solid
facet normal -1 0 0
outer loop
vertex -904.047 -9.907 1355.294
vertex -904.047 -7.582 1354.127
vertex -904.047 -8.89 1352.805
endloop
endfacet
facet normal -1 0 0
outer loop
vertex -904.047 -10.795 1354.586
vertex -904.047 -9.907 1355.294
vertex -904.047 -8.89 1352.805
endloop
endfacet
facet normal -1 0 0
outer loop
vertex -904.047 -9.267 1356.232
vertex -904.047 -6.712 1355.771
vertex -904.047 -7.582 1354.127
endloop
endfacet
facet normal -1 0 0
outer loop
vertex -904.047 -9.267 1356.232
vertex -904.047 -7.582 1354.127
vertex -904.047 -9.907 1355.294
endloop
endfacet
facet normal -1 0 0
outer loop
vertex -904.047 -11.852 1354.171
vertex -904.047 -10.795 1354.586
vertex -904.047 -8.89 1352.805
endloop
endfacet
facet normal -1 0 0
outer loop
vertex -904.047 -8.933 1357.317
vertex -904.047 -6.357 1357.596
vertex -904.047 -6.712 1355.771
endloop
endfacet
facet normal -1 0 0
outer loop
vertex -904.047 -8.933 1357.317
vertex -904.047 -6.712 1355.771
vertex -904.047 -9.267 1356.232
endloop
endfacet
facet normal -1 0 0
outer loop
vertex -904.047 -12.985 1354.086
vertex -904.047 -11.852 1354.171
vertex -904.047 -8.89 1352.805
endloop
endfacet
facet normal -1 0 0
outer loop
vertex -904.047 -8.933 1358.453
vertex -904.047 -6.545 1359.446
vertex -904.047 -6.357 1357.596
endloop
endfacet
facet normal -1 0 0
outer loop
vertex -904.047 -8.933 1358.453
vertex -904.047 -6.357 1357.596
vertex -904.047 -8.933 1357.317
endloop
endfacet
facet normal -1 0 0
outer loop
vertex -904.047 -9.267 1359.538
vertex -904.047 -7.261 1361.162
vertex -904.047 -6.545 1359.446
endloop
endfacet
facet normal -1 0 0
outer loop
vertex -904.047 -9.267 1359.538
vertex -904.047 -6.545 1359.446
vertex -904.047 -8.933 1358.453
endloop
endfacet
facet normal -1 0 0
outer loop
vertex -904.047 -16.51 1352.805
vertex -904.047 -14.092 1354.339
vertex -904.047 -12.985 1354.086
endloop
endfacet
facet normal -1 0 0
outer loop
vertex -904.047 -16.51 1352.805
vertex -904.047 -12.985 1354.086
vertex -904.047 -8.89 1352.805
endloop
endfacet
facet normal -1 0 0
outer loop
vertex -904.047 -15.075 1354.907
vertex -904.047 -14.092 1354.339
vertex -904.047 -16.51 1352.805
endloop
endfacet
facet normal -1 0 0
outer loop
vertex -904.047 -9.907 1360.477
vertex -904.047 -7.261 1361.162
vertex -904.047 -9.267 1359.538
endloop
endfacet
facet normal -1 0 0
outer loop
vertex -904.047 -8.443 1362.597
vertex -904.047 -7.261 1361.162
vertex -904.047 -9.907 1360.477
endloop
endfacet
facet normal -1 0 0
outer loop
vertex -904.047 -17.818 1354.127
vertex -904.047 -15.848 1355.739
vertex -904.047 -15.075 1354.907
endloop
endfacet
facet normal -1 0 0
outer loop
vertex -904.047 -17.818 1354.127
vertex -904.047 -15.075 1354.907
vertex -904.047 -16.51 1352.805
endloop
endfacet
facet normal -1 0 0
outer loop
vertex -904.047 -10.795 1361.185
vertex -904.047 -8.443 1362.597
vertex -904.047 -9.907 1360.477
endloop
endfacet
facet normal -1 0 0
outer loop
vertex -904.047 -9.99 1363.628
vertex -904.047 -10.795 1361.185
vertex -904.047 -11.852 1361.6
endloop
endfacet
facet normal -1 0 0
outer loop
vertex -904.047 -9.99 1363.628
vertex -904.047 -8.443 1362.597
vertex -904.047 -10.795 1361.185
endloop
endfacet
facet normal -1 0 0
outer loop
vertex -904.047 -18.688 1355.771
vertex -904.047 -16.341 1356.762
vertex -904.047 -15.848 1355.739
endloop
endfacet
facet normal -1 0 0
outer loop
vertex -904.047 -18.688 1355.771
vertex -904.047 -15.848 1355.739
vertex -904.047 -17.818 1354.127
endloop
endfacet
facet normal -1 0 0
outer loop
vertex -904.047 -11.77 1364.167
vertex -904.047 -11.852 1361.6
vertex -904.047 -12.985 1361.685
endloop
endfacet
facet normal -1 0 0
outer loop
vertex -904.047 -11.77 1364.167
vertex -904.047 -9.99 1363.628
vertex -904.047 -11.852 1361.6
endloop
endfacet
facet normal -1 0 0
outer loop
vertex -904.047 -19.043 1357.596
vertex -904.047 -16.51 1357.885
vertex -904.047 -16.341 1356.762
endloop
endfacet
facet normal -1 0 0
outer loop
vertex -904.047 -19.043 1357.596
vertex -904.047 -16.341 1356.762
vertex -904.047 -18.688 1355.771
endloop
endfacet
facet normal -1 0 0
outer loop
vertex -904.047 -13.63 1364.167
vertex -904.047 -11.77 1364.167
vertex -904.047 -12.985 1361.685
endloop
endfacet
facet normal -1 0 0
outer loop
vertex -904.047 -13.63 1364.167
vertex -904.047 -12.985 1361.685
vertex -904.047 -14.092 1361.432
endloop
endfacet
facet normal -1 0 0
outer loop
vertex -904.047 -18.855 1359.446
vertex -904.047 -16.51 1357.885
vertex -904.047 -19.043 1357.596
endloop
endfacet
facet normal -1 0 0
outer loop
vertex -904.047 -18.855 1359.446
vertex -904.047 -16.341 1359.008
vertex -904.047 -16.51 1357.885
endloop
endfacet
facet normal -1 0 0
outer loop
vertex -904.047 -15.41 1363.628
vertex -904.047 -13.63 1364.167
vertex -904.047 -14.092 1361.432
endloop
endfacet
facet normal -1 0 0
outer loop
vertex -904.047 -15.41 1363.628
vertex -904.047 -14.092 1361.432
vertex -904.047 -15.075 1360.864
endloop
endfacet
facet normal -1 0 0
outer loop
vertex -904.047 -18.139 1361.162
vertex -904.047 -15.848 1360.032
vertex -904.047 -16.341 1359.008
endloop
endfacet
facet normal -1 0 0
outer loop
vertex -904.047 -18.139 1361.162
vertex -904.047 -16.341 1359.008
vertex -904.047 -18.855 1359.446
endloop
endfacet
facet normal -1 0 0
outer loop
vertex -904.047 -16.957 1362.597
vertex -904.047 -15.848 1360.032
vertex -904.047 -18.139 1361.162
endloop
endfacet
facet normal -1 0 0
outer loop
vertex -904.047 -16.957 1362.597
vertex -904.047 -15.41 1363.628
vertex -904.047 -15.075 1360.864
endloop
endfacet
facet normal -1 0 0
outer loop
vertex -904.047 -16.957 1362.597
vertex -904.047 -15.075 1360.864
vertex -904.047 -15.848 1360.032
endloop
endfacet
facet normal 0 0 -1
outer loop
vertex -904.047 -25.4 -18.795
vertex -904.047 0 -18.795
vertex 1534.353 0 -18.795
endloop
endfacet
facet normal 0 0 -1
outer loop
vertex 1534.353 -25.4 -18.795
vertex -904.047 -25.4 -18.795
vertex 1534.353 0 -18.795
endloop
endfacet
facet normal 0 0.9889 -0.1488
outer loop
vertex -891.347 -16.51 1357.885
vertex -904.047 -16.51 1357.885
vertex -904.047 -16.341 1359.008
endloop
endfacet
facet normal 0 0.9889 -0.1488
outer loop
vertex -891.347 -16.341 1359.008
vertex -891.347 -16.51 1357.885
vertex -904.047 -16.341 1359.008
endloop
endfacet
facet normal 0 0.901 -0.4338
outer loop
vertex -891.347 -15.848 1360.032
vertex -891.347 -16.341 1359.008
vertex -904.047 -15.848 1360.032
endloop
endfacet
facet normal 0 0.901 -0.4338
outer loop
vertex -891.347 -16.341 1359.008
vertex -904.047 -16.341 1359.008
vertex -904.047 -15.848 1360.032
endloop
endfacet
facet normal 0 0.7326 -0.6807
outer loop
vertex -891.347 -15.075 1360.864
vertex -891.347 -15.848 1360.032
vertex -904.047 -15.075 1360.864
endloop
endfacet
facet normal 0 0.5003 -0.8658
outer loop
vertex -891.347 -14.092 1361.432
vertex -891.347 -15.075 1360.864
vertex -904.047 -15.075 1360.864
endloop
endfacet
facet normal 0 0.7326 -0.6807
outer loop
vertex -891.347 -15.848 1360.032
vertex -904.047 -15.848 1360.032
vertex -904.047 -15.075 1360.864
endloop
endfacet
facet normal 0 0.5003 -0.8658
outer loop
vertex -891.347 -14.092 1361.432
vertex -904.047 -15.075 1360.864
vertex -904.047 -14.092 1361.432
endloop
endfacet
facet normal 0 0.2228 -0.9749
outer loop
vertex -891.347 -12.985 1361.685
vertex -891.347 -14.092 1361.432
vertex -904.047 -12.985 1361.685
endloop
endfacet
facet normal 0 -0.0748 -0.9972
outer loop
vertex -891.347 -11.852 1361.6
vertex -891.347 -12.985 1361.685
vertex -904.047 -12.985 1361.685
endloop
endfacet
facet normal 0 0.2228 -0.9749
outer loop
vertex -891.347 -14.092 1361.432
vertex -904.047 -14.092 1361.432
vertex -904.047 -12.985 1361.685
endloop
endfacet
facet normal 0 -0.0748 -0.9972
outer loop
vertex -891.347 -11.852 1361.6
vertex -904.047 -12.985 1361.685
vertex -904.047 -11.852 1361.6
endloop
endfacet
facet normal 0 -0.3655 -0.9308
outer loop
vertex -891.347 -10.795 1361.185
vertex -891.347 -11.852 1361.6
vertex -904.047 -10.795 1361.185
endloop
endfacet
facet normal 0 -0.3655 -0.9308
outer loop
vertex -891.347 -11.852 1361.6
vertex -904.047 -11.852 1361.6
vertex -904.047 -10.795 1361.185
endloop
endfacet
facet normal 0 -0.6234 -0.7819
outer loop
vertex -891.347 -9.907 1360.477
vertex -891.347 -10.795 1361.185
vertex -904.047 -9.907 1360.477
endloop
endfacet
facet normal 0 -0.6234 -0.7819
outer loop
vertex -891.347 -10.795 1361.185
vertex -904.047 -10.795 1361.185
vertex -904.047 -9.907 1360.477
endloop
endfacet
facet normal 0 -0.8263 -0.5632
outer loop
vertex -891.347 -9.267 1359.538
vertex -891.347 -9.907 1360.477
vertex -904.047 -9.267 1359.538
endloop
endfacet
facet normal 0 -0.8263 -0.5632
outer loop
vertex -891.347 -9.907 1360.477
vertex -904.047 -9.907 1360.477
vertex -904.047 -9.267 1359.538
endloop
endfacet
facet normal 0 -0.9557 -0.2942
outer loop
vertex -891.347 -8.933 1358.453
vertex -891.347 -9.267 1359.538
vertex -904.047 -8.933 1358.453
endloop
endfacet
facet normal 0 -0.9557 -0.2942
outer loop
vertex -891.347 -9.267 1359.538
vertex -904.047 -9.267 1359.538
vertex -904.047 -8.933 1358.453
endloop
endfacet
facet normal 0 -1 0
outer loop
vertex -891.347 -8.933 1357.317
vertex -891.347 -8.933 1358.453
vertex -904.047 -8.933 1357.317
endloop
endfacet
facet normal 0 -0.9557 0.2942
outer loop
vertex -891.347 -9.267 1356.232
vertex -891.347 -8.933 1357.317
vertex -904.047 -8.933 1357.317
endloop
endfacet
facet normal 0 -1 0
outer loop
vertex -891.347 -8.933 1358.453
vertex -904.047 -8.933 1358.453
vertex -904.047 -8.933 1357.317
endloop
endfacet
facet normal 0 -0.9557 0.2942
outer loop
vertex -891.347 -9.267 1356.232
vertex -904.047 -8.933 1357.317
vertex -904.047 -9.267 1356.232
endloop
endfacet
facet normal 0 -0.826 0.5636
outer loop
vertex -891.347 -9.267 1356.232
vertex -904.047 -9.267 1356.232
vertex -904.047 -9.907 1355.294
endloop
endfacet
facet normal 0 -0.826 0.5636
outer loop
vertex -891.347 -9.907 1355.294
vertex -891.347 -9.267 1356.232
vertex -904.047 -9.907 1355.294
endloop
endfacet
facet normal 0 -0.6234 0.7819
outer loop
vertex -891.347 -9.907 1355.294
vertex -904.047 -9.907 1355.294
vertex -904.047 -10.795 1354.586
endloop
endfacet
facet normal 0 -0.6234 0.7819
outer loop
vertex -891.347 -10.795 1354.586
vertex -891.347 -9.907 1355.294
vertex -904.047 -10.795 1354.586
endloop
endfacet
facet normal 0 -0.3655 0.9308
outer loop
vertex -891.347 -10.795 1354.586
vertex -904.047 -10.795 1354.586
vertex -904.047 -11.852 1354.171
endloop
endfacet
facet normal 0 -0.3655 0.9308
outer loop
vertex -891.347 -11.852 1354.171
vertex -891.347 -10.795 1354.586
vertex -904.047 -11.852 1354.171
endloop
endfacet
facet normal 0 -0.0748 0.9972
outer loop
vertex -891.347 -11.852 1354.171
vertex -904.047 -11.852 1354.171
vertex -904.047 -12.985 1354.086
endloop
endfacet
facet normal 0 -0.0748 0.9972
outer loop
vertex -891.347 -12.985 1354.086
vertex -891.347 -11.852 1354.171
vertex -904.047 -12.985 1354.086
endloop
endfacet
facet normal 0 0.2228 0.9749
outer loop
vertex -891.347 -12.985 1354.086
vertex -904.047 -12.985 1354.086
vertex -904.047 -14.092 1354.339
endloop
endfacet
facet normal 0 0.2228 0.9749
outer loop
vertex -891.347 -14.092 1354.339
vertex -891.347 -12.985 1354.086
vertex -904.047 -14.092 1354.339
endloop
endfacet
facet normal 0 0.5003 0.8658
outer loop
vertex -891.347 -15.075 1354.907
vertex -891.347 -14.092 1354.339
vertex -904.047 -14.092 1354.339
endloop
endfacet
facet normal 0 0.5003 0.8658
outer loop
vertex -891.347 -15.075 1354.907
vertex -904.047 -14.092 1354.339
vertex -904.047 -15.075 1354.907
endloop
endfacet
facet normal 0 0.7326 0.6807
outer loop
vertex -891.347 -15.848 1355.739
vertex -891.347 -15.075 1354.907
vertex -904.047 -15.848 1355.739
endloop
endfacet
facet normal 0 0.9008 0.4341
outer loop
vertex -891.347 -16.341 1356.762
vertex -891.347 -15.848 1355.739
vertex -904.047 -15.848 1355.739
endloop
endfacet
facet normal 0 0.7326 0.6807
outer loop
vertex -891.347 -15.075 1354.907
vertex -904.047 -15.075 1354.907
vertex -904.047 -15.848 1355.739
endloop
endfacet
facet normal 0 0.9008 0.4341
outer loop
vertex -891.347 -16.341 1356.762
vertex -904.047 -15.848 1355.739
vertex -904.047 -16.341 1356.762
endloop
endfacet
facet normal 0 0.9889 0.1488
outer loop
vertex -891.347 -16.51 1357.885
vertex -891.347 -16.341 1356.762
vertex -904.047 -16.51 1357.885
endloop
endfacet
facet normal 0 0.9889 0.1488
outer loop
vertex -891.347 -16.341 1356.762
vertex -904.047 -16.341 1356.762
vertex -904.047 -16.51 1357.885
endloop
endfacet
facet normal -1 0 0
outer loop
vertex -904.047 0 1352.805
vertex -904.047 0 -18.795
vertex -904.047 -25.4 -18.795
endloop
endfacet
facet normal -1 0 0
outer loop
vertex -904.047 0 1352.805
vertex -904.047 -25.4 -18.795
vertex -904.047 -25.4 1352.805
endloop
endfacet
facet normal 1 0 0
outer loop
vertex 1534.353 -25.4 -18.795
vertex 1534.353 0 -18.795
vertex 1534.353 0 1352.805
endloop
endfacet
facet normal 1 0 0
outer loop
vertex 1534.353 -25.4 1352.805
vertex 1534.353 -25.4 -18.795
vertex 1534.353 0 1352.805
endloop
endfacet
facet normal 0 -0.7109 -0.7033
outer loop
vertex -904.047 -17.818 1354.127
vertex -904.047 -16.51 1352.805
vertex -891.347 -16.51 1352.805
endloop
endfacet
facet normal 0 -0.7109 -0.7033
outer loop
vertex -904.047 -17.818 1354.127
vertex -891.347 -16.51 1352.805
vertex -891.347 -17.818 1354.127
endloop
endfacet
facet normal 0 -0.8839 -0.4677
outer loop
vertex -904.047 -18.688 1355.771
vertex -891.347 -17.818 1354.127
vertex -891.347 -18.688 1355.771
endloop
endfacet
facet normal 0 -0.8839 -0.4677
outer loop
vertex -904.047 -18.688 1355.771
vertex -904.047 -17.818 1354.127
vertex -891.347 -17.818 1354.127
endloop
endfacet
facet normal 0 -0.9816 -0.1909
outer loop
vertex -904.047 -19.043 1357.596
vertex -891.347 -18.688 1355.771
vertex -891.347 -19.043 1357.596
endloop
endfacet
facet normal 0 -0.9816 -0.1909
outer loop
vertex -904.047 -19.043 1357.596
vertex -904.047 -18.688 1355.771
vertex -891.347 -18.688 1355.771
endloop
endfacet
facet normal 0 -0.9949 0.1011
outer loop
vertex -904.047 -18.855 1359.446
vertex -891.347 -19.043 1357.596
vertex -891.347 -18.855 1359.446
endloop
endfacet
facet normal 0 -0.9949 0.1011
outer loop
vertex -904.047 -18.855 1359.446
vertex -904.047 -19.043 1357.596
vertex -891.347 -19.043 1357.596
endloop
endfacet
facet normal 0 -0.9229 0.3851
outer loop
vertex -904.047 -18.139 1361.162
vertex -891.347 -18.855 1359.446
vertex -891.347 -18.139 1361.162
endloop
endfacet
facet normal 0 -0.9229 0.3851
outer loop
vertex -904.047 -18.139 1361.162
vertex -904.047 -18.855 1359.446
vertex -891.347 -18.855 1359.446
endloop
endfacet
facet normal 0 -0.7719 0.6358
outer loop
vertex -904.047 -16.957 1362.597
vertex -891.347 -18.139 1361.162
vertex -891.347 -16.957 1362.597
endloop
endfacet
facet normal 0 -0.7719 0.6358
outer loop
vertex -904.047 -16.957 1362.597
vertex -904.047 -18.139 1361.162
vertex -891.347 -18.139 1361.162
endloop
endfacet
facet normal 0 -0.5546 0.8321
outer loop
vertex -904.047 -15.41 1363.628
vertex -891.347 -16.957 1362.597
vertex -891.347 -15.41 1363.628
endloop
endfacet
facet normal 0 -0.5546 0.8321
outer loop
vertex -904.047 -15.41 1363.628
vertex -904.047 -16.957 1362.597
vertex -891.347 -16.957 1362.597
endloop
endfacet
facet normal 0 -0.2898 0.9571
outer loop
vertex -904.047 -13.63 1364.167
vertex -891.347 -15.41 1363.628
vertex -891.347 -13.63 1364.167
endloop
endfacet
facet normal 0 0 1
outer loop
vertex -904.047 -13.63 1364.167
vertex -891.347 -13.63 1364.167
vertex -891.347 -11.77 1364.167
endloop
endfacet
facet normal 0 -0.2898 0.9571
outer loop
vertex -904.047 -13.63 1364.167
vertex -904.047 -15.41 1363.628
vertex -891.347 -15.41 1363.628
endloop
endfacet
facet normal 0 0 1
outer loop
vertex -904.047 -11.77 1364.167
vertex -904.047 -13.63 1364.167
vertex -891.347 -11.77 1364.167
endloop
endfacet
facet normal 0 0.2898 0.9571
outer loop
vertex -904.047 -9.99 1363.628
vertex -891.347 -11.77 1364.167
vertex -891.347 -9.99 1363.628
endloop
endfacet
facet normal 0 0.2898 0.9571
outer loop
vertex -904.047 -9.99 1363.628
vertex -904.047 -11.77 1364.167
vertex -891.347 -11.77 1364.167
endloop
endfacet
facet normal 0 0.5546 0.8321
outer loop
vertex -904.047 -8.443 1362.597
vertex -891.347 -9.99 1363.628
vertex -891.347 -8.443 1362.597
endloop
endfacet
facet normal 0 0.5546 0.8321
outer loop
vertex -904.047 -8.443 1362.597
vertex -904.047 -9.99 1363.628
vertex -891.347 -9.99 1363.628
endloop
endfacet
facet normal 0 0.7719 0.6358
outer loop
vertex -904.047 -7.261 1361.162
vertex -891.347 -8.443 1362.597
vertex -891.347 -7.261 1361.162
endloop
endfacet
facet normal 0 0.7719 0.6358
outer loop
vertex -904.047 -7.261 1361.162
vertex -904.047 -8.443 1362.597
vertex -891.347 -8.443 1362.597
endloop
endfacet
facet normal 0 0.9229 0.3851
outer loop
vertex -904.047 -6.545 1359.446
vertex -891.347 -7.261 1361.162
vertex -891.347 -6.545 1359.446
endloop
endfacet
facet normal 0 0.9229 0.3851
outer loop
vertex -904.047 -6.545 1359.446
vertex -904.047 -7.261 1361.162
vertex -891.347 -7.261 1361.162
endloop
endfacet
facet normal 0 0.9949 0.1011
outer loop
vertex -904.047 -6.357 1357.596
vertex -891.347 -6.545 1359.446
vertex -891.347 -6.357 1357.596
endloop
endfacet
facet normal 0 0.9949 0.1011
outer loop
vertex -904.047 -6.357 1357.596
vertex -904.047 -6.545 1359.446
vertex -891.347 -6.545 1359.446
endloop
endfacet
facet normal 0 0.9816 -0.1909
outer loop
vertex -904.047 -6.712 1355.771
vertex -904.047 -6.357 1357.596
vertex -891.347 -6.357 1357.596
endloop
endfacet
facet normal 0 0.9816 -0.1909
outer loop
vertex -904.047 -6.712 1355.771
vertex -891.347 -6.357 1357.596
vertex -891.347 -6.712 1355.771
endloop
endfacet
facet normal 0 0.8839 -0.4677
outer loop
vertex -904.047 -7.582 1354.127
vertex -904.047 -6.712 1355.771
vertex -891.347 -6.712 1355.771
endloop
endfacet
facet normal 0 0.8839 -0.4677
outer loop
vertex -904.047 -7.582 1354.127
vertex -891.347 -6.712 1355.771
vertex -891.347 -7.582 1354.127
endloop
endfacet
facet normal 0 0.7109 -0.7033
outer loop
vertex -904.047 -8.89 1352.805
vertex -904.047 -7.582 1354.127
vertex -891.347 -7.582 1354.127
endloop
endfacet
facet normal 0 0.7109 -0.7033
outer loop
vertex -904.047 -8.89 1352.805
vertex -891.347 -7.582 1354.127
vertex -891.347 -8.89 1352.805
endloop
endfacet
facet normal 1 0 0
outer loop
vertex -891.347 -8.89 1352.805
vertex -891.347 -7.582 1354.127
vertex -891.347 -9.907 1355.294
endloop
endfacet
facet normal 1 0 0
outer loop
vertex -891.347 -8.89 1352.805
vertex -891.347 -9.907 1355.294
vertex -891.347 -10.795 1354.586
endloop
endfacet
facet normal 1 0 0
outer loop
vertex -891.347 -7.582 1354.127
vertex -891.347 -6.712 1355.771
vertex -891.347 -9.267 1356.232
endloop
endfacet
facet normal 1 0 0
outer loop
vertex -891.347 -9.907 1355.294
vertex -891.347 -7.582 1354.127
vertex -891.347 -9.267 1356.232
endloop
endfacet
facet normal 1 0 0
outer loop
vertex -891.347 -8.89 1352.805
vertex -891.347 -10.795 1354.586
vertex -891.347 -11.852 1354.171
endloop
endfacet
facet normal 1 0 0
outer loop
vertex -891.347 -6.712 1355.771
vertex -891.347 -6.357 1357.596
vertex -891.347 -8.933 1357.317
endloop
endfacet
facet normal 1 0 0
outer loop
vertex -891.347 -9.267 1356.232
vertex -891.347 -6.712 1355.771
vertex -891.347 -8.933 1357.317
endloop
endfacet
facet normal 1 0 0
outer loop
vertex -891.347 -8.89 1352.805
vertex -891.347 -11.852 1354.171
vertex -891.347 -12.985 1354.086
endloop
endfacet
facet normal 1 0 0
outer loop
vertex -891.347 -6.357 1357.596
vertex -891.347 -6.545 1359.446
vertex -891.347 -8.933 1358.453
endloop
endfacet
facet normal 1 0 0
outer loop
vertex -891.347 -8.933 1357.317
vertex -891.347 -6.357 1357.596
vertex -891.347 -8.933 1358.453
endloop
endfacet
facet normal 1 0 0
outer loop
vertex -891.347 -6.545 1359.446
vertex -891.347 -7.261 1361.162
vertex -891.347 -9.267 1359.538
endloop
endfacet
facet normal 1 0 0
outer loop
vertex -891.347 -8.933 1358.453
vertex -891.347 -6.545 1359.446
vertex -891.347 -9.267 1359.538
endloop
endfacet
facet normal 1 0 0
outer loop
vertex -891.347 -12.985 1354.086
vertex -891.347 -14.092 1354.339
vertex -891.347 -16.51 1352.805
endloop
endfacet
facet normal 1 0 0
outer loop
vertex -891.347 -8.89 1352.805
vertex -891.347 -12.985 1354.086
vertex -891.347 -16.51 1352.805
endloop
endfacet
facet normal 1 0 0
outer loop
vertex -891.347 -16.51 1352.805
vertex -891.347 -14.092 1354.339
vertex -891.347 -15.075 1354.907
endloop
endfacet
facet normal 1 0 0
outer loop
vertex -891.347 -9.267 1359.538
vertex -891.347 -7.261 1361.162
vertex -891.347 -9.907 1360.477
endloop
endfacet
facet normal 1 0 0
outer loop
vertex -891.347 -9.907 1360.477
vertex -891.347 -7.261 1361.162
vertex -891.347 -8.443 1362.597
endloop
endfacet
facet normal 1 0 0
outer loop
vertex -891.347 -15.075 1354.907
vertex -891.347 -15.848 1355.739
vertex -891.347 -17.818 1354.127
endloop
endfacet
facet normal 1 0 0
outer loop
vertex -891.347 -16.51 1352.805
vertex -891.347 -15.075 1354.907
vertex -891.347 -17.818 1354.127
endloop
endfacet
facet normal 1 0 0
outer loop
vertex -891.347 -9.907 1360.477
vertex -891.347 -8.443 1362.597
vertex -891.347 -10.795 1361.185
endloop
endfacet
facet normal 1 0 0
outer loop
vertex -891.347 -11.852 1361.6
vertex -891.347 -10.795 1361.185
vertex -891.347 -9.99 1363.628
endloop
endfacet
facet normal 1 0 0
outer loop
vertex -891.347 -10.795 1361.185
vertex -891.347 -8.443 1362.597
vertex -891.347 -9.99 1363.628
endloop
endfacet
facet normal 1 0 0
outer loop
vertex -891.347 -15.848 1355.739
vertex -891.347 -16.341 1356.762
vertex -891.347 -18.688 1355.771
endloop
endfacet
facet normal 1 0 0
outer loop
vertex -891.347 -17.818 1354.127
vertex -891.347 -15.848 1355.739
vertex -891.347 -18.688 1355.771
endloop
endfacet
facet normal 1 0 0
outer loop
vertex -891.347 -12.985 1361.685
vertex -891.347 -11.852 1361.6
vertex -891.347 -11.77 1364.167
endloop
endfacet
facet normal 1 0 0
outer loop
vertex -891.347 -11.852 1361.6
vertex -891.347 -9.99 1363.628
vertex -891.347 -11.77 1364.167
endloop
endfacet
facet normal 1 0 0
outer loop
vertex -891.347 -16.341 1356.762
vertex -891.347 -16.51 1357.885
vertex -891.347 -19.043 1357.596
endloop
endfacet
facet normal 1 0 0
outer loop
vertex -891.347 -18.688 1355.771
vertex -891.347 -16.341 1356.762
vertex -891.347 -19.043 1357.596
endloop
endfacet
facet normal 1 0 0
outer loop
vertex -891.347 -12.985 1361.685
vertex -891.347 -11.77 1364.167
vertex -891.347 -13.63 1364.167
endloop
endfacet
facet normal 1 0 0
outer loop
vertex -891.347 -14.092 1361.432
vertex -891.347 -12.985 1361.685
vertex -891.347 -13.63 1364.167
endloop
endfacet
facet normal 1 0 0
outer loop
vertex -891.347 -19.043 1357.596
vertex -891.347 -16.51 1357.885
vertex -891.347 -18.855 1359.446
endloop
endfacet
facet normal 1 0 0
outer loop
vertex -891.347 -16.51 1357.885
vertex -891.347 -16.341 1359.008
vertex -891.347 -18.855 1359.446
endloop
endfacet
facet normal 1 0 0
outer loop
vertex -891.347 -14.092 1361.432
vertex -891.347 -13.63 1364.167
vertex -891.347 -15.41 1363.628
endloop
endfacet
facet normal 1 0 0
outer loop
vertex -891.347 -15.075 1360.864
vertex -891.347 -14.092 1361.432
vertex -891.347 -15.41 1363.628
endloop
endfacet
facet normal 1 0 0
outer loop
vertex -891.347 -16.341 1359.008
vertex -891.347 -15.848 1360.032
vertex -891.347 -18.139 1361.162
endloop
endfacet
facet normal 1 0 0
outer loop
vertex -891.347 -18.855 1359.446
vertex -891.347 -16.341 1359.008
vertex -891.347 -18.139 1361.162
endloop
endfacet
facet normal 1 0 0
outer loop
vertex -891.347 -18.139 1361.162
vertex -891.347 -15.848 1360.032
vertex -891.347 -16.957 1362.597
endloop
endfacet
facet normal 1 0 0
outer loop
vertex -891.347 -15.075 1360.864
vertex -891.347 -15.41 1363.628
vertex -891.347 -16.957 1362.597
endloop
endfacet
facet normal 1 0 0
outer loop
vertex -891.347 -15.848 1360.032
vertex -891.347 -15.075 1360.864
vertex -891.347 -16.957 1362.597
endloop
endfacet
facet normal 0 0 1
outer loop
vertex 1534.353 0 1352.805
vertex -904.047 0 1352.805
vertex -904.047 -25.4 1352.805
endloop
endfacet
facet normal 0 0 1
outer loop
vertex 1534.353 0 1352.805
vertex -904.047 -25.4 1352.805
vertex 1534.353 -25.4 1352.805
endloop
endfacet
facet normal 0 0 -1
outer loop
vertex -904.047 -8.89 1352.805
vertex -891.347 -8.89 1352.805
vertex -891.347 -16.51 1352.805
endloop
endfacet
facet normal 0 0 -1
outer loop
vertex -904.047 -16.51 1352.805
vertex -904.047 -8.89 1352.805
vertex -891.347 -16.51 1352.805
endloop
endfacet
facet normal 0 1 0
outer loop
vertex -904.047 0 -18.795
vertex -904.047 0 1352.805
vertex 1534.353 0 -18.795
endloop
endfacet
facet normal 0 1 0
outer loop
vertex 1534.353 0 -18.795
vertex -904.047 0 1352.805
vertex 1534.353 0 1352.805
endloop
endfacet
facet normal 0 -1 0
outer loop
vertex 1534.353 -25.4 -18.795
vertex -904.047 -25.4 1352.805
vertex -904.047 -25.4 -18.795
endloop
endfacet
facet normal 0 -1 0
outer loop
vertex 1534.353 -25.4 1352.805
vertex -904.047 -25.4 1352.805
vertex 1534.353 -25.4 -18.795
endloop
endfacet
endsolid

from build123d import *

# Parameters (mm, degrees)
F0_W     = 2438.4
F0_H     = 1371.6
F1_DEPTH = 25.4
F2_R     = 3.81
F3_DEPTH = 12.7


with BuildPart() as f1:
    # F0 (on Front) → F1 (new body)
    with BuildSketch(Plane.XZ):
        with Locations((315.153241, 667.00529)):
            Rectangle(F0_W, F0_H)
    extrude(amount=F1_DEPTH)


with BuildPart() as f3:
    # F2 (on face) → F3 (new body)
    with BuildSketch(Plane(origin=(-904.046759, 0, 0), x_dir=(0, -1, 0), z_dir=(-1, 0, 0))):
        with BuildLine():
            Line((8.89, 1352.80529), (16.51, 1352.80529))
            ThreePointArc((16.51, 1352.80529), (12.7, 1364.23529), (8.89, 1352.80529))
        make_face()
        with Locations((12.7, 1357.88529)):
            Circle(F2_R, mode=Mode.SUBTRACT)
    extrude(amount=-F3_DEPTH)


solid = Compound([f1.part, f3.part])
